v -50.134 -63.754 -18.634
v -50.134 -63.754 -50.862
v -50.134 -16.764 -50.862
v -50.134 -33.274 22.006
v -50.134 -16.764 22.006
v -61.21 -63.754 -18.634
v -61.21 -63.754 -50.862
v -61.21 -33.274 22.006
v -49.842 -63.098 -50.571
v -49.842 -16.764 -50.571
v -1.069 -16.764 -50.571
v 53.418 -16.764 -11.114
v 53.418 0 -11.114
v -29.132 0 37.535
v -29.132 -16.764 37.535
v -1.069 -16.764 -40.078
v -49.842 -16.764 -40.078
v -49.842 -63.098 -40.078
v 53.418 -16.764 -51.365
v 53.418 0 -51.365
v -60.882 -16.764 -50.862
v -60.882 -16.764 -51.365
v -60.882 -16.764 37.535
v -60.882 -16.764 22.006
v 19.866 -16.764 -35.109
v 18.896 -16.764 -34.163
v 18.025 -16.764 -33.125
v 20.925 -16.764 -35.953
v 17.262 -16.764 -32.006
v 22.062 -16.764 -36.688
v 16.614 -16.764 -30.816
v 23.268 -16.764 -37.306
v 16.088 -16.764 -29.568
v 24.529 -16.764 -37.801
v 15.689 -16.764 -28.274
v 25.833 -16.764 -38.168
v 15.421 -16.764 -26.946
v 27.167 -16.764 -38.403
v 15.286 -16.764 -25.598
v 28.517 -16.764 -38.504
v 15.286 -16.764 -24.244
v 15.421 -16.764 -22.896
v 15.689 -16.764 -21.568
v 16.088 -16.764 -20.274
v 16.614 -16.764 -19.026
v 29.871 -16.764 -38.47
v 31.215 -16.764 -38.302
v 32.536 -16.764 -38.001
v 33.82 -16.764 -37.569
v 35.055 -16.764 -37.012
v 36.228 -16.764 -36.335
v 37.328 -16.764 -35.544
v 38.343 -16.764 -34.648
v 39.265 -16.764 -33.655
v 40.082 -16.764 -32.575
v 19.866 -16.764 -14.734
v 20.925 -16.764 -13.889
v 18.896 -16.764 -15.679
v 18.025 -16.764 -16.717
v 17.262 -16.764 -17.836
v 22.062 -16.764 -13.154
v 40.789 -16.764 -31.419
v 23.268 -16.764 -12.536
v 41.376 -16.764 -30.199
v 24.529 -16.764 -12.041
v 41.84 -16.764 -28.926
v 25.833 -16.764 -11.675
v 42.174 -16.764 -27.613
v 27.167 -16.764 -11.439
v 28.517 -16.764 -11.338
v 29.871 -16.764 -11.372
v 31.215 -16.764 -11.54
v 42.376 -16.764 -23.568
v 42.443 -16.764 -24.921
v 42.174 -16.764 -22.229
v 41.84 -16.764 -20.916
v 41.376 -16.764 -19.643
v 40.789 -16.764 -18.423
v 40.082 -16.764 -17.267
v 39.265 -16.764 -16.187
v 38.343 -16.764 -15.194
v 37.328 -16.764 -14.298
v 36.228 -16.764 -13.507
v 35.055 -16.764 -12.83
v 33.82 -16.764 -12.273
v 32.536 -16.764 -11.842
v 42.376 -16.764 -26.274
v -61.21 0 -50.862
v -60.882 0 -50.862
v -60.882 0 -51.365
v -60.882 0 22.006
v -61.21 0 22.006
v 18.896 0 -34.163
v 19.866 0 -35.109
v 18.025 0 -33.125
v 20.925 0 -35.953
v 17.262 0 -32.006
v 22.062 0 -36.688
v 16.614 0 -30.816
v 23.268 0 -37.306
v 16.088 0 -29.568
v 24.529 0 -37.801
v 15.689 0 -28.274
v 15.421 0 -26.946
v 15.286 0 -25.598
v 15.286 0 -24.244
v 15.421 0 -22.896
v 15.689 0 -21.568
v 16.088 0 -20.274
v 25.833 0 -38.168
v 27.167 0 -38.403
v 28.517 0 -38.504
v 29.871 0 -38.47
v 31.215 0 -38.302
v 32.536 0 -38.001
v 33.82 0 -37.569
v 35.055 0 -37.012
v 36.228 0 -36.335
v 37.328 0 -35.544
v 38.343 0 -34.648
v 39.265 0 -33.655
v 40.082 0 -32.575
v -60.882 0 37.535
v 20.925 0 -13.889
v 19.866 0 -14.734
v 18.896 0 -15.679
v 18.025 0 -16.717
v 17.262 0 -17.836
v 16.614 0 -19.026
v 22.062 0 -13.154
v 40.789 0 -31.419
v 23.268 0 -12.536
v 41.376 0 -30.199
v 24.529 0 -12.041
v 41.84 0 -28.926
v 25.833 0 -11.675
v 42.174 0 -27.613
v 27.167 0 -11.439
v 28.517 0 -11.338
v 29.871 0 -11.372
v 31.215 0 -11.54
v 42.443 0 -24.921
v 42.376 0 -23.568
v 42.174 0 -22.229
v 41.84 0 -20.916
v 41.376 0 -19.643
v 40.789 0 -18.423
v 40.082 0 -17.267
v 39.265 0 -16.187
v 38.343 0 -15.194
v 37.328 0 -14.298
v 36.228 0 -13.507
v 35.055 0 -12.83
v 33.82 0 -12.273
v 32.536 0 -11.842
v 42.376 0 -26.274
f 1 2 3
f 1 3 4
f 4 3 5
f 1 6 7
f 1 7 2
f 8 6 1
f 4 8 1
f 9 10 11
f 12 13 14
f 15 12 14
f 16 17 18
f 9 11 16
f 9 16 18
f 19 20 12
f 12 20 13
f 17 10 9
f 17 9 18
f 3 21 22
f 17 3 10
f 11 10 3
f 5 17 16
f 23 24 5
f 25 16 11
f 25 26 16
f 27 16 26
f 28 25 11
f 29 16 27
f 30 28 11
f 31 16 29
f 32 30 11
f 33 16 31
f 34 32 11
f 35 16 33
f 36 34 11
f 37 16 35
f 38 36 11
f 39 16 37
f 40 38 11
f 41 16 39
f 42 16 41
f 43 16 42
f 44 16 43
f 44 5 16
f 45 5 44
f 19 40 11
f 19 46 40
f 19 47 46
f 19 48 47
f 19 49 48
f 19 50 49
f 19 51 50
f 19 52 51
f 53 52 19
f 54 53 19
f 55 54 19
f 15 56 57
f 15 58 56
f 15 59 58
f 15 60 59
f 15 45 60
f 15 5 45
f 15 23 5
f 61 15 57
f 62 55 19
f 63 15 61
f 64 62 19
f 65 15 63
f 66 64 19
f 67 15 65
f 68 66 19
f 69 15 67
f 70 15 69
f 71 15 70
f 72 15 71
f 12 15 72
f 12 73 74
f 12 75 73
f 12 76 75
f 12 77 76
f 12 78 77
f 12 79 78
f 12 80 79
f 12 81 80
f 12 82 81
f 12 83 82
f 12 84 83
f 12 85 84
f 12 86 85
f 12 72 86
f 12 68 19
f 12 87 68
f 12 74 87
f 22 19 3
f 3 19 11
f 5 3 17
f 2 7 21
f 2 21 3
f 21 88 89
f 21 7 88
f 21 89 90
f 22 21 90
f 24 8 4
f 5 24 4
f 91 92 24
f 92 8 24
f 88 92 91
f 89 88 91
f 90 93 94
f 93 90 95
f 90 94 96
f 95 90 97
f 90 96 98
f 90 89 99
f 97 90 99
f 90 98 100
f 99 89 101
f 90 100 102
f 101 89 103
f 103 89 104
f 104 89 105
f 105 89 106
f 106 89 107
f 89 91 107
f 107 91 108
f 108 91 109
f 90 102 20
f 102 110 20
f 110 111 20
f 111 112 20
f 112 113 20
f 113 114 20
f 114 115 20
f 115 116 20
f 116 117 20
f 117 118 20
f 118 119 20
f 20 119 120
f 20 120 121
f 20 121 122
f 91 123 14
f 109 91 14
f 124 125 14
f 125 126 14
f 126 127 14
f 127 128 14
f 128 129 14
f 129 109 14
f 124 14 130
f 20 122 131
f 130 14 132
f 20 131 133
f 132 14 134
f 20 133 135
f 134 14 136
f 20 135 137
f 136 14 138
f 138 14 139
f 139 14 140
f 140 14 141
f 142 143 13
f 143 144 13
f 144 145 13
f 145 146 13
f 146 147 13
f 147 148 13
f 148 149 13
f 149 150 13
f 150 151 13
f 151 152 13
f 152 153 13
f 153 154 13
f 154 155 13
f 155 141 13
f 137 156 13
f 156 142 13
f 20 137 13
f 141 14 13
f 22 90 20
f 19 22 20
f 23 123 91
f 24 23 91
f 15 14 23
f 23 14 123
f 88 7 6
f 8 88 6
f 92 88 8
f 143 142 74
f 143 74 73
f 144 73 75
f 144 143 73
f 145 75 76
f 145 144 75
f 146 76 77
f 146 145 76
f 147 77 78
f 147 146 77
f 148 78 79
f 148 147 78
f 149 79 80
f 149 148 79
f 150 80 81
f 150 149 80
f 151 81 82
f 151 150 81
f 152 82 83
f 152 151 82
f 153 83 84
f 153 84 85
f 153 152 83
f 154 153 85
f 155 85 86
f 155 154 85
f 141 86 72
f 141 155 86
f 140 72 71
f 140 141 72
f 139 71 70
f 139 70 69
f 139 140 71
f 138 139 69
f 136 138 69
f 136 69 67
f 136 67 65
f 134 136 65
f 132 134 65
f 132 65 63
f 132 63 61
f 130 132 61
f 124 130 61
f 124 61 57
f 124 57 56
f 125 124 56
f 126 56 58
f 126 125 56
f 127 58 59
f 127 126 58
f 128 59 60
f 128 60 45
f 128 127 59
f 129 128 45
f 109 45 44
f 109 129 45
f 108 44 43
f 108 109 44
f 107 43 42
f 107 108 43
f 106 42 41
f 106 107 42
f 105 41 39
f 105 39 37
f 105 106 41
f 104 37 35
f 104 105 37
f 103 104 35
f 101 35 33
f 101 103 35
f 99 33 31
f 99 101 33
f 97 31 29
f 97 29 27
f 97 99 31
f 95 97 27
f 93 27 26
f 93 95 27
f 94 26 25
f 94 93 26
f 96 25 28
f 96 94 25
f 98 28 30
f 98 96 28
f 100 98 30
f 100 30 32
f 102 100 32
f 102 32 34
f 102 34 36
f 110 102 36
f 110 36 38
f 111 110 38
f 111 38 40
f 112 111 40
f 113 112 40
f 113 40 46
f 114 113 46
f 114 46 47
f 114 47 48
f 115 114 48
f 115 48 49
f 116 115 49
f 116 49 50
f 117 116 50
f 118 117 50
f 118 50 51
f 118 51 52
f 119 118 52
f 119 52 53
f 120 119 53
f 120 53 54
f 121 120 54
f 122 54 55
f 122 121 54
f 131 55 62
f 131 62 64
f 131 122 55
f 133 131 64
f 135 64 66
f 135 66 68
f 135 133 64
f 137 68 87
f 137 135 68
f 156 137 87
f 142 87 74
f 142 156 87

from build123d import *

# Parameters (mm, degrees)
F0_R        = 13.5872580749
F1_DEPTH    = 16.764
F2_W        = 11.076066643
F2_H        = 72.8688556701
F3_DEPTH    = 63.754
F4_SIZE2    = 40.64
F4_SIZE     = 30.48
F5_W        = 49.8422943056
F5_H        = 10.4931145906
F6_DEPTH    = 64.008
F7_T4_DEPTH = 271.9527686037


# Not quite as in the source:
# - a fillet or chamfer that OpenCascade refuses, or shapes differently, is made with other operations: its cross-section is extruded or revolved along the edge and cut away or added


with BuildPart() as f1:
    # F0 (on Front) → F1 (new body)
    with BuildSketch(Plane.XZ):
        Polygon((-29.1315091585, 37.5352683077), (-60.8815091585, 37.5352683077), (-60.8815091585, -51.3647316923), (53.4184908415, -51.3647316923), (53.4184908415, -11.1139282757), align=None)
        with Locations((28.8560632616, -24.9211471528)):
            Circle(F0_R, mode=Mode.SUBTRACT)
    extrude(amount=F1_DEPTH)

    # F2 (on Front) → F3 (join)
    with BuildSketch(Plane.XZ):
        with Locations((-55.6718055159, -14.4280334935)):
            Rectangle(F2_W, F2_H)
    extrude(amount=F3_DEPTH)

    # F4
    f4_edges = [f1.edges().sort_by_distance(p)[0] for p in [
        (-55.671806, -63.754, 22.006394),
    ]]
    f4_side = f1.faces().sort_by_distance((-55.728042, -39.925416, 22.006394))[0]
    chamfer(f4_edges, length=F4_SIZE, length2=F4_SIZE2, reference=f4_side)

    # F5 (on Front) → F6 (join)
    with BuildSketch(Plane.XZ):
        with Locations((-24.9211471528, -45.3244261444)):
            Rectangle(F5_W, F5_H)
    extrude(amount=F6_DEPTH)

    # F7: chamfer of 48.26 x 50.8 on 1 edges, made by hand


with BuildPart() as f7_tool2:
    # F7_s3 → F7_t4 (new body)
    with BuildSketch(Plane.XY.offset(-181.3008104462)):
        Polygon((0, -15.748), (-50.8, -64.008), (0, -64.008), align=None)
    extrude(amount=F7_T4_DEPTH)

    split(bisect_by=Plane.XZ.offset(16.764), keep=Keep.TOP)

    split(bisect_by=Plane.YZ.offset(-49.8422943056), keep=Keep.TOP)


with BuildPart() as f1_1:
    add(f1.part)

    # F7_t1: cut F7_tool2
    add(f7_tool2.part, mode=Mode.SUBTRACT)


solid = f1_1.part
